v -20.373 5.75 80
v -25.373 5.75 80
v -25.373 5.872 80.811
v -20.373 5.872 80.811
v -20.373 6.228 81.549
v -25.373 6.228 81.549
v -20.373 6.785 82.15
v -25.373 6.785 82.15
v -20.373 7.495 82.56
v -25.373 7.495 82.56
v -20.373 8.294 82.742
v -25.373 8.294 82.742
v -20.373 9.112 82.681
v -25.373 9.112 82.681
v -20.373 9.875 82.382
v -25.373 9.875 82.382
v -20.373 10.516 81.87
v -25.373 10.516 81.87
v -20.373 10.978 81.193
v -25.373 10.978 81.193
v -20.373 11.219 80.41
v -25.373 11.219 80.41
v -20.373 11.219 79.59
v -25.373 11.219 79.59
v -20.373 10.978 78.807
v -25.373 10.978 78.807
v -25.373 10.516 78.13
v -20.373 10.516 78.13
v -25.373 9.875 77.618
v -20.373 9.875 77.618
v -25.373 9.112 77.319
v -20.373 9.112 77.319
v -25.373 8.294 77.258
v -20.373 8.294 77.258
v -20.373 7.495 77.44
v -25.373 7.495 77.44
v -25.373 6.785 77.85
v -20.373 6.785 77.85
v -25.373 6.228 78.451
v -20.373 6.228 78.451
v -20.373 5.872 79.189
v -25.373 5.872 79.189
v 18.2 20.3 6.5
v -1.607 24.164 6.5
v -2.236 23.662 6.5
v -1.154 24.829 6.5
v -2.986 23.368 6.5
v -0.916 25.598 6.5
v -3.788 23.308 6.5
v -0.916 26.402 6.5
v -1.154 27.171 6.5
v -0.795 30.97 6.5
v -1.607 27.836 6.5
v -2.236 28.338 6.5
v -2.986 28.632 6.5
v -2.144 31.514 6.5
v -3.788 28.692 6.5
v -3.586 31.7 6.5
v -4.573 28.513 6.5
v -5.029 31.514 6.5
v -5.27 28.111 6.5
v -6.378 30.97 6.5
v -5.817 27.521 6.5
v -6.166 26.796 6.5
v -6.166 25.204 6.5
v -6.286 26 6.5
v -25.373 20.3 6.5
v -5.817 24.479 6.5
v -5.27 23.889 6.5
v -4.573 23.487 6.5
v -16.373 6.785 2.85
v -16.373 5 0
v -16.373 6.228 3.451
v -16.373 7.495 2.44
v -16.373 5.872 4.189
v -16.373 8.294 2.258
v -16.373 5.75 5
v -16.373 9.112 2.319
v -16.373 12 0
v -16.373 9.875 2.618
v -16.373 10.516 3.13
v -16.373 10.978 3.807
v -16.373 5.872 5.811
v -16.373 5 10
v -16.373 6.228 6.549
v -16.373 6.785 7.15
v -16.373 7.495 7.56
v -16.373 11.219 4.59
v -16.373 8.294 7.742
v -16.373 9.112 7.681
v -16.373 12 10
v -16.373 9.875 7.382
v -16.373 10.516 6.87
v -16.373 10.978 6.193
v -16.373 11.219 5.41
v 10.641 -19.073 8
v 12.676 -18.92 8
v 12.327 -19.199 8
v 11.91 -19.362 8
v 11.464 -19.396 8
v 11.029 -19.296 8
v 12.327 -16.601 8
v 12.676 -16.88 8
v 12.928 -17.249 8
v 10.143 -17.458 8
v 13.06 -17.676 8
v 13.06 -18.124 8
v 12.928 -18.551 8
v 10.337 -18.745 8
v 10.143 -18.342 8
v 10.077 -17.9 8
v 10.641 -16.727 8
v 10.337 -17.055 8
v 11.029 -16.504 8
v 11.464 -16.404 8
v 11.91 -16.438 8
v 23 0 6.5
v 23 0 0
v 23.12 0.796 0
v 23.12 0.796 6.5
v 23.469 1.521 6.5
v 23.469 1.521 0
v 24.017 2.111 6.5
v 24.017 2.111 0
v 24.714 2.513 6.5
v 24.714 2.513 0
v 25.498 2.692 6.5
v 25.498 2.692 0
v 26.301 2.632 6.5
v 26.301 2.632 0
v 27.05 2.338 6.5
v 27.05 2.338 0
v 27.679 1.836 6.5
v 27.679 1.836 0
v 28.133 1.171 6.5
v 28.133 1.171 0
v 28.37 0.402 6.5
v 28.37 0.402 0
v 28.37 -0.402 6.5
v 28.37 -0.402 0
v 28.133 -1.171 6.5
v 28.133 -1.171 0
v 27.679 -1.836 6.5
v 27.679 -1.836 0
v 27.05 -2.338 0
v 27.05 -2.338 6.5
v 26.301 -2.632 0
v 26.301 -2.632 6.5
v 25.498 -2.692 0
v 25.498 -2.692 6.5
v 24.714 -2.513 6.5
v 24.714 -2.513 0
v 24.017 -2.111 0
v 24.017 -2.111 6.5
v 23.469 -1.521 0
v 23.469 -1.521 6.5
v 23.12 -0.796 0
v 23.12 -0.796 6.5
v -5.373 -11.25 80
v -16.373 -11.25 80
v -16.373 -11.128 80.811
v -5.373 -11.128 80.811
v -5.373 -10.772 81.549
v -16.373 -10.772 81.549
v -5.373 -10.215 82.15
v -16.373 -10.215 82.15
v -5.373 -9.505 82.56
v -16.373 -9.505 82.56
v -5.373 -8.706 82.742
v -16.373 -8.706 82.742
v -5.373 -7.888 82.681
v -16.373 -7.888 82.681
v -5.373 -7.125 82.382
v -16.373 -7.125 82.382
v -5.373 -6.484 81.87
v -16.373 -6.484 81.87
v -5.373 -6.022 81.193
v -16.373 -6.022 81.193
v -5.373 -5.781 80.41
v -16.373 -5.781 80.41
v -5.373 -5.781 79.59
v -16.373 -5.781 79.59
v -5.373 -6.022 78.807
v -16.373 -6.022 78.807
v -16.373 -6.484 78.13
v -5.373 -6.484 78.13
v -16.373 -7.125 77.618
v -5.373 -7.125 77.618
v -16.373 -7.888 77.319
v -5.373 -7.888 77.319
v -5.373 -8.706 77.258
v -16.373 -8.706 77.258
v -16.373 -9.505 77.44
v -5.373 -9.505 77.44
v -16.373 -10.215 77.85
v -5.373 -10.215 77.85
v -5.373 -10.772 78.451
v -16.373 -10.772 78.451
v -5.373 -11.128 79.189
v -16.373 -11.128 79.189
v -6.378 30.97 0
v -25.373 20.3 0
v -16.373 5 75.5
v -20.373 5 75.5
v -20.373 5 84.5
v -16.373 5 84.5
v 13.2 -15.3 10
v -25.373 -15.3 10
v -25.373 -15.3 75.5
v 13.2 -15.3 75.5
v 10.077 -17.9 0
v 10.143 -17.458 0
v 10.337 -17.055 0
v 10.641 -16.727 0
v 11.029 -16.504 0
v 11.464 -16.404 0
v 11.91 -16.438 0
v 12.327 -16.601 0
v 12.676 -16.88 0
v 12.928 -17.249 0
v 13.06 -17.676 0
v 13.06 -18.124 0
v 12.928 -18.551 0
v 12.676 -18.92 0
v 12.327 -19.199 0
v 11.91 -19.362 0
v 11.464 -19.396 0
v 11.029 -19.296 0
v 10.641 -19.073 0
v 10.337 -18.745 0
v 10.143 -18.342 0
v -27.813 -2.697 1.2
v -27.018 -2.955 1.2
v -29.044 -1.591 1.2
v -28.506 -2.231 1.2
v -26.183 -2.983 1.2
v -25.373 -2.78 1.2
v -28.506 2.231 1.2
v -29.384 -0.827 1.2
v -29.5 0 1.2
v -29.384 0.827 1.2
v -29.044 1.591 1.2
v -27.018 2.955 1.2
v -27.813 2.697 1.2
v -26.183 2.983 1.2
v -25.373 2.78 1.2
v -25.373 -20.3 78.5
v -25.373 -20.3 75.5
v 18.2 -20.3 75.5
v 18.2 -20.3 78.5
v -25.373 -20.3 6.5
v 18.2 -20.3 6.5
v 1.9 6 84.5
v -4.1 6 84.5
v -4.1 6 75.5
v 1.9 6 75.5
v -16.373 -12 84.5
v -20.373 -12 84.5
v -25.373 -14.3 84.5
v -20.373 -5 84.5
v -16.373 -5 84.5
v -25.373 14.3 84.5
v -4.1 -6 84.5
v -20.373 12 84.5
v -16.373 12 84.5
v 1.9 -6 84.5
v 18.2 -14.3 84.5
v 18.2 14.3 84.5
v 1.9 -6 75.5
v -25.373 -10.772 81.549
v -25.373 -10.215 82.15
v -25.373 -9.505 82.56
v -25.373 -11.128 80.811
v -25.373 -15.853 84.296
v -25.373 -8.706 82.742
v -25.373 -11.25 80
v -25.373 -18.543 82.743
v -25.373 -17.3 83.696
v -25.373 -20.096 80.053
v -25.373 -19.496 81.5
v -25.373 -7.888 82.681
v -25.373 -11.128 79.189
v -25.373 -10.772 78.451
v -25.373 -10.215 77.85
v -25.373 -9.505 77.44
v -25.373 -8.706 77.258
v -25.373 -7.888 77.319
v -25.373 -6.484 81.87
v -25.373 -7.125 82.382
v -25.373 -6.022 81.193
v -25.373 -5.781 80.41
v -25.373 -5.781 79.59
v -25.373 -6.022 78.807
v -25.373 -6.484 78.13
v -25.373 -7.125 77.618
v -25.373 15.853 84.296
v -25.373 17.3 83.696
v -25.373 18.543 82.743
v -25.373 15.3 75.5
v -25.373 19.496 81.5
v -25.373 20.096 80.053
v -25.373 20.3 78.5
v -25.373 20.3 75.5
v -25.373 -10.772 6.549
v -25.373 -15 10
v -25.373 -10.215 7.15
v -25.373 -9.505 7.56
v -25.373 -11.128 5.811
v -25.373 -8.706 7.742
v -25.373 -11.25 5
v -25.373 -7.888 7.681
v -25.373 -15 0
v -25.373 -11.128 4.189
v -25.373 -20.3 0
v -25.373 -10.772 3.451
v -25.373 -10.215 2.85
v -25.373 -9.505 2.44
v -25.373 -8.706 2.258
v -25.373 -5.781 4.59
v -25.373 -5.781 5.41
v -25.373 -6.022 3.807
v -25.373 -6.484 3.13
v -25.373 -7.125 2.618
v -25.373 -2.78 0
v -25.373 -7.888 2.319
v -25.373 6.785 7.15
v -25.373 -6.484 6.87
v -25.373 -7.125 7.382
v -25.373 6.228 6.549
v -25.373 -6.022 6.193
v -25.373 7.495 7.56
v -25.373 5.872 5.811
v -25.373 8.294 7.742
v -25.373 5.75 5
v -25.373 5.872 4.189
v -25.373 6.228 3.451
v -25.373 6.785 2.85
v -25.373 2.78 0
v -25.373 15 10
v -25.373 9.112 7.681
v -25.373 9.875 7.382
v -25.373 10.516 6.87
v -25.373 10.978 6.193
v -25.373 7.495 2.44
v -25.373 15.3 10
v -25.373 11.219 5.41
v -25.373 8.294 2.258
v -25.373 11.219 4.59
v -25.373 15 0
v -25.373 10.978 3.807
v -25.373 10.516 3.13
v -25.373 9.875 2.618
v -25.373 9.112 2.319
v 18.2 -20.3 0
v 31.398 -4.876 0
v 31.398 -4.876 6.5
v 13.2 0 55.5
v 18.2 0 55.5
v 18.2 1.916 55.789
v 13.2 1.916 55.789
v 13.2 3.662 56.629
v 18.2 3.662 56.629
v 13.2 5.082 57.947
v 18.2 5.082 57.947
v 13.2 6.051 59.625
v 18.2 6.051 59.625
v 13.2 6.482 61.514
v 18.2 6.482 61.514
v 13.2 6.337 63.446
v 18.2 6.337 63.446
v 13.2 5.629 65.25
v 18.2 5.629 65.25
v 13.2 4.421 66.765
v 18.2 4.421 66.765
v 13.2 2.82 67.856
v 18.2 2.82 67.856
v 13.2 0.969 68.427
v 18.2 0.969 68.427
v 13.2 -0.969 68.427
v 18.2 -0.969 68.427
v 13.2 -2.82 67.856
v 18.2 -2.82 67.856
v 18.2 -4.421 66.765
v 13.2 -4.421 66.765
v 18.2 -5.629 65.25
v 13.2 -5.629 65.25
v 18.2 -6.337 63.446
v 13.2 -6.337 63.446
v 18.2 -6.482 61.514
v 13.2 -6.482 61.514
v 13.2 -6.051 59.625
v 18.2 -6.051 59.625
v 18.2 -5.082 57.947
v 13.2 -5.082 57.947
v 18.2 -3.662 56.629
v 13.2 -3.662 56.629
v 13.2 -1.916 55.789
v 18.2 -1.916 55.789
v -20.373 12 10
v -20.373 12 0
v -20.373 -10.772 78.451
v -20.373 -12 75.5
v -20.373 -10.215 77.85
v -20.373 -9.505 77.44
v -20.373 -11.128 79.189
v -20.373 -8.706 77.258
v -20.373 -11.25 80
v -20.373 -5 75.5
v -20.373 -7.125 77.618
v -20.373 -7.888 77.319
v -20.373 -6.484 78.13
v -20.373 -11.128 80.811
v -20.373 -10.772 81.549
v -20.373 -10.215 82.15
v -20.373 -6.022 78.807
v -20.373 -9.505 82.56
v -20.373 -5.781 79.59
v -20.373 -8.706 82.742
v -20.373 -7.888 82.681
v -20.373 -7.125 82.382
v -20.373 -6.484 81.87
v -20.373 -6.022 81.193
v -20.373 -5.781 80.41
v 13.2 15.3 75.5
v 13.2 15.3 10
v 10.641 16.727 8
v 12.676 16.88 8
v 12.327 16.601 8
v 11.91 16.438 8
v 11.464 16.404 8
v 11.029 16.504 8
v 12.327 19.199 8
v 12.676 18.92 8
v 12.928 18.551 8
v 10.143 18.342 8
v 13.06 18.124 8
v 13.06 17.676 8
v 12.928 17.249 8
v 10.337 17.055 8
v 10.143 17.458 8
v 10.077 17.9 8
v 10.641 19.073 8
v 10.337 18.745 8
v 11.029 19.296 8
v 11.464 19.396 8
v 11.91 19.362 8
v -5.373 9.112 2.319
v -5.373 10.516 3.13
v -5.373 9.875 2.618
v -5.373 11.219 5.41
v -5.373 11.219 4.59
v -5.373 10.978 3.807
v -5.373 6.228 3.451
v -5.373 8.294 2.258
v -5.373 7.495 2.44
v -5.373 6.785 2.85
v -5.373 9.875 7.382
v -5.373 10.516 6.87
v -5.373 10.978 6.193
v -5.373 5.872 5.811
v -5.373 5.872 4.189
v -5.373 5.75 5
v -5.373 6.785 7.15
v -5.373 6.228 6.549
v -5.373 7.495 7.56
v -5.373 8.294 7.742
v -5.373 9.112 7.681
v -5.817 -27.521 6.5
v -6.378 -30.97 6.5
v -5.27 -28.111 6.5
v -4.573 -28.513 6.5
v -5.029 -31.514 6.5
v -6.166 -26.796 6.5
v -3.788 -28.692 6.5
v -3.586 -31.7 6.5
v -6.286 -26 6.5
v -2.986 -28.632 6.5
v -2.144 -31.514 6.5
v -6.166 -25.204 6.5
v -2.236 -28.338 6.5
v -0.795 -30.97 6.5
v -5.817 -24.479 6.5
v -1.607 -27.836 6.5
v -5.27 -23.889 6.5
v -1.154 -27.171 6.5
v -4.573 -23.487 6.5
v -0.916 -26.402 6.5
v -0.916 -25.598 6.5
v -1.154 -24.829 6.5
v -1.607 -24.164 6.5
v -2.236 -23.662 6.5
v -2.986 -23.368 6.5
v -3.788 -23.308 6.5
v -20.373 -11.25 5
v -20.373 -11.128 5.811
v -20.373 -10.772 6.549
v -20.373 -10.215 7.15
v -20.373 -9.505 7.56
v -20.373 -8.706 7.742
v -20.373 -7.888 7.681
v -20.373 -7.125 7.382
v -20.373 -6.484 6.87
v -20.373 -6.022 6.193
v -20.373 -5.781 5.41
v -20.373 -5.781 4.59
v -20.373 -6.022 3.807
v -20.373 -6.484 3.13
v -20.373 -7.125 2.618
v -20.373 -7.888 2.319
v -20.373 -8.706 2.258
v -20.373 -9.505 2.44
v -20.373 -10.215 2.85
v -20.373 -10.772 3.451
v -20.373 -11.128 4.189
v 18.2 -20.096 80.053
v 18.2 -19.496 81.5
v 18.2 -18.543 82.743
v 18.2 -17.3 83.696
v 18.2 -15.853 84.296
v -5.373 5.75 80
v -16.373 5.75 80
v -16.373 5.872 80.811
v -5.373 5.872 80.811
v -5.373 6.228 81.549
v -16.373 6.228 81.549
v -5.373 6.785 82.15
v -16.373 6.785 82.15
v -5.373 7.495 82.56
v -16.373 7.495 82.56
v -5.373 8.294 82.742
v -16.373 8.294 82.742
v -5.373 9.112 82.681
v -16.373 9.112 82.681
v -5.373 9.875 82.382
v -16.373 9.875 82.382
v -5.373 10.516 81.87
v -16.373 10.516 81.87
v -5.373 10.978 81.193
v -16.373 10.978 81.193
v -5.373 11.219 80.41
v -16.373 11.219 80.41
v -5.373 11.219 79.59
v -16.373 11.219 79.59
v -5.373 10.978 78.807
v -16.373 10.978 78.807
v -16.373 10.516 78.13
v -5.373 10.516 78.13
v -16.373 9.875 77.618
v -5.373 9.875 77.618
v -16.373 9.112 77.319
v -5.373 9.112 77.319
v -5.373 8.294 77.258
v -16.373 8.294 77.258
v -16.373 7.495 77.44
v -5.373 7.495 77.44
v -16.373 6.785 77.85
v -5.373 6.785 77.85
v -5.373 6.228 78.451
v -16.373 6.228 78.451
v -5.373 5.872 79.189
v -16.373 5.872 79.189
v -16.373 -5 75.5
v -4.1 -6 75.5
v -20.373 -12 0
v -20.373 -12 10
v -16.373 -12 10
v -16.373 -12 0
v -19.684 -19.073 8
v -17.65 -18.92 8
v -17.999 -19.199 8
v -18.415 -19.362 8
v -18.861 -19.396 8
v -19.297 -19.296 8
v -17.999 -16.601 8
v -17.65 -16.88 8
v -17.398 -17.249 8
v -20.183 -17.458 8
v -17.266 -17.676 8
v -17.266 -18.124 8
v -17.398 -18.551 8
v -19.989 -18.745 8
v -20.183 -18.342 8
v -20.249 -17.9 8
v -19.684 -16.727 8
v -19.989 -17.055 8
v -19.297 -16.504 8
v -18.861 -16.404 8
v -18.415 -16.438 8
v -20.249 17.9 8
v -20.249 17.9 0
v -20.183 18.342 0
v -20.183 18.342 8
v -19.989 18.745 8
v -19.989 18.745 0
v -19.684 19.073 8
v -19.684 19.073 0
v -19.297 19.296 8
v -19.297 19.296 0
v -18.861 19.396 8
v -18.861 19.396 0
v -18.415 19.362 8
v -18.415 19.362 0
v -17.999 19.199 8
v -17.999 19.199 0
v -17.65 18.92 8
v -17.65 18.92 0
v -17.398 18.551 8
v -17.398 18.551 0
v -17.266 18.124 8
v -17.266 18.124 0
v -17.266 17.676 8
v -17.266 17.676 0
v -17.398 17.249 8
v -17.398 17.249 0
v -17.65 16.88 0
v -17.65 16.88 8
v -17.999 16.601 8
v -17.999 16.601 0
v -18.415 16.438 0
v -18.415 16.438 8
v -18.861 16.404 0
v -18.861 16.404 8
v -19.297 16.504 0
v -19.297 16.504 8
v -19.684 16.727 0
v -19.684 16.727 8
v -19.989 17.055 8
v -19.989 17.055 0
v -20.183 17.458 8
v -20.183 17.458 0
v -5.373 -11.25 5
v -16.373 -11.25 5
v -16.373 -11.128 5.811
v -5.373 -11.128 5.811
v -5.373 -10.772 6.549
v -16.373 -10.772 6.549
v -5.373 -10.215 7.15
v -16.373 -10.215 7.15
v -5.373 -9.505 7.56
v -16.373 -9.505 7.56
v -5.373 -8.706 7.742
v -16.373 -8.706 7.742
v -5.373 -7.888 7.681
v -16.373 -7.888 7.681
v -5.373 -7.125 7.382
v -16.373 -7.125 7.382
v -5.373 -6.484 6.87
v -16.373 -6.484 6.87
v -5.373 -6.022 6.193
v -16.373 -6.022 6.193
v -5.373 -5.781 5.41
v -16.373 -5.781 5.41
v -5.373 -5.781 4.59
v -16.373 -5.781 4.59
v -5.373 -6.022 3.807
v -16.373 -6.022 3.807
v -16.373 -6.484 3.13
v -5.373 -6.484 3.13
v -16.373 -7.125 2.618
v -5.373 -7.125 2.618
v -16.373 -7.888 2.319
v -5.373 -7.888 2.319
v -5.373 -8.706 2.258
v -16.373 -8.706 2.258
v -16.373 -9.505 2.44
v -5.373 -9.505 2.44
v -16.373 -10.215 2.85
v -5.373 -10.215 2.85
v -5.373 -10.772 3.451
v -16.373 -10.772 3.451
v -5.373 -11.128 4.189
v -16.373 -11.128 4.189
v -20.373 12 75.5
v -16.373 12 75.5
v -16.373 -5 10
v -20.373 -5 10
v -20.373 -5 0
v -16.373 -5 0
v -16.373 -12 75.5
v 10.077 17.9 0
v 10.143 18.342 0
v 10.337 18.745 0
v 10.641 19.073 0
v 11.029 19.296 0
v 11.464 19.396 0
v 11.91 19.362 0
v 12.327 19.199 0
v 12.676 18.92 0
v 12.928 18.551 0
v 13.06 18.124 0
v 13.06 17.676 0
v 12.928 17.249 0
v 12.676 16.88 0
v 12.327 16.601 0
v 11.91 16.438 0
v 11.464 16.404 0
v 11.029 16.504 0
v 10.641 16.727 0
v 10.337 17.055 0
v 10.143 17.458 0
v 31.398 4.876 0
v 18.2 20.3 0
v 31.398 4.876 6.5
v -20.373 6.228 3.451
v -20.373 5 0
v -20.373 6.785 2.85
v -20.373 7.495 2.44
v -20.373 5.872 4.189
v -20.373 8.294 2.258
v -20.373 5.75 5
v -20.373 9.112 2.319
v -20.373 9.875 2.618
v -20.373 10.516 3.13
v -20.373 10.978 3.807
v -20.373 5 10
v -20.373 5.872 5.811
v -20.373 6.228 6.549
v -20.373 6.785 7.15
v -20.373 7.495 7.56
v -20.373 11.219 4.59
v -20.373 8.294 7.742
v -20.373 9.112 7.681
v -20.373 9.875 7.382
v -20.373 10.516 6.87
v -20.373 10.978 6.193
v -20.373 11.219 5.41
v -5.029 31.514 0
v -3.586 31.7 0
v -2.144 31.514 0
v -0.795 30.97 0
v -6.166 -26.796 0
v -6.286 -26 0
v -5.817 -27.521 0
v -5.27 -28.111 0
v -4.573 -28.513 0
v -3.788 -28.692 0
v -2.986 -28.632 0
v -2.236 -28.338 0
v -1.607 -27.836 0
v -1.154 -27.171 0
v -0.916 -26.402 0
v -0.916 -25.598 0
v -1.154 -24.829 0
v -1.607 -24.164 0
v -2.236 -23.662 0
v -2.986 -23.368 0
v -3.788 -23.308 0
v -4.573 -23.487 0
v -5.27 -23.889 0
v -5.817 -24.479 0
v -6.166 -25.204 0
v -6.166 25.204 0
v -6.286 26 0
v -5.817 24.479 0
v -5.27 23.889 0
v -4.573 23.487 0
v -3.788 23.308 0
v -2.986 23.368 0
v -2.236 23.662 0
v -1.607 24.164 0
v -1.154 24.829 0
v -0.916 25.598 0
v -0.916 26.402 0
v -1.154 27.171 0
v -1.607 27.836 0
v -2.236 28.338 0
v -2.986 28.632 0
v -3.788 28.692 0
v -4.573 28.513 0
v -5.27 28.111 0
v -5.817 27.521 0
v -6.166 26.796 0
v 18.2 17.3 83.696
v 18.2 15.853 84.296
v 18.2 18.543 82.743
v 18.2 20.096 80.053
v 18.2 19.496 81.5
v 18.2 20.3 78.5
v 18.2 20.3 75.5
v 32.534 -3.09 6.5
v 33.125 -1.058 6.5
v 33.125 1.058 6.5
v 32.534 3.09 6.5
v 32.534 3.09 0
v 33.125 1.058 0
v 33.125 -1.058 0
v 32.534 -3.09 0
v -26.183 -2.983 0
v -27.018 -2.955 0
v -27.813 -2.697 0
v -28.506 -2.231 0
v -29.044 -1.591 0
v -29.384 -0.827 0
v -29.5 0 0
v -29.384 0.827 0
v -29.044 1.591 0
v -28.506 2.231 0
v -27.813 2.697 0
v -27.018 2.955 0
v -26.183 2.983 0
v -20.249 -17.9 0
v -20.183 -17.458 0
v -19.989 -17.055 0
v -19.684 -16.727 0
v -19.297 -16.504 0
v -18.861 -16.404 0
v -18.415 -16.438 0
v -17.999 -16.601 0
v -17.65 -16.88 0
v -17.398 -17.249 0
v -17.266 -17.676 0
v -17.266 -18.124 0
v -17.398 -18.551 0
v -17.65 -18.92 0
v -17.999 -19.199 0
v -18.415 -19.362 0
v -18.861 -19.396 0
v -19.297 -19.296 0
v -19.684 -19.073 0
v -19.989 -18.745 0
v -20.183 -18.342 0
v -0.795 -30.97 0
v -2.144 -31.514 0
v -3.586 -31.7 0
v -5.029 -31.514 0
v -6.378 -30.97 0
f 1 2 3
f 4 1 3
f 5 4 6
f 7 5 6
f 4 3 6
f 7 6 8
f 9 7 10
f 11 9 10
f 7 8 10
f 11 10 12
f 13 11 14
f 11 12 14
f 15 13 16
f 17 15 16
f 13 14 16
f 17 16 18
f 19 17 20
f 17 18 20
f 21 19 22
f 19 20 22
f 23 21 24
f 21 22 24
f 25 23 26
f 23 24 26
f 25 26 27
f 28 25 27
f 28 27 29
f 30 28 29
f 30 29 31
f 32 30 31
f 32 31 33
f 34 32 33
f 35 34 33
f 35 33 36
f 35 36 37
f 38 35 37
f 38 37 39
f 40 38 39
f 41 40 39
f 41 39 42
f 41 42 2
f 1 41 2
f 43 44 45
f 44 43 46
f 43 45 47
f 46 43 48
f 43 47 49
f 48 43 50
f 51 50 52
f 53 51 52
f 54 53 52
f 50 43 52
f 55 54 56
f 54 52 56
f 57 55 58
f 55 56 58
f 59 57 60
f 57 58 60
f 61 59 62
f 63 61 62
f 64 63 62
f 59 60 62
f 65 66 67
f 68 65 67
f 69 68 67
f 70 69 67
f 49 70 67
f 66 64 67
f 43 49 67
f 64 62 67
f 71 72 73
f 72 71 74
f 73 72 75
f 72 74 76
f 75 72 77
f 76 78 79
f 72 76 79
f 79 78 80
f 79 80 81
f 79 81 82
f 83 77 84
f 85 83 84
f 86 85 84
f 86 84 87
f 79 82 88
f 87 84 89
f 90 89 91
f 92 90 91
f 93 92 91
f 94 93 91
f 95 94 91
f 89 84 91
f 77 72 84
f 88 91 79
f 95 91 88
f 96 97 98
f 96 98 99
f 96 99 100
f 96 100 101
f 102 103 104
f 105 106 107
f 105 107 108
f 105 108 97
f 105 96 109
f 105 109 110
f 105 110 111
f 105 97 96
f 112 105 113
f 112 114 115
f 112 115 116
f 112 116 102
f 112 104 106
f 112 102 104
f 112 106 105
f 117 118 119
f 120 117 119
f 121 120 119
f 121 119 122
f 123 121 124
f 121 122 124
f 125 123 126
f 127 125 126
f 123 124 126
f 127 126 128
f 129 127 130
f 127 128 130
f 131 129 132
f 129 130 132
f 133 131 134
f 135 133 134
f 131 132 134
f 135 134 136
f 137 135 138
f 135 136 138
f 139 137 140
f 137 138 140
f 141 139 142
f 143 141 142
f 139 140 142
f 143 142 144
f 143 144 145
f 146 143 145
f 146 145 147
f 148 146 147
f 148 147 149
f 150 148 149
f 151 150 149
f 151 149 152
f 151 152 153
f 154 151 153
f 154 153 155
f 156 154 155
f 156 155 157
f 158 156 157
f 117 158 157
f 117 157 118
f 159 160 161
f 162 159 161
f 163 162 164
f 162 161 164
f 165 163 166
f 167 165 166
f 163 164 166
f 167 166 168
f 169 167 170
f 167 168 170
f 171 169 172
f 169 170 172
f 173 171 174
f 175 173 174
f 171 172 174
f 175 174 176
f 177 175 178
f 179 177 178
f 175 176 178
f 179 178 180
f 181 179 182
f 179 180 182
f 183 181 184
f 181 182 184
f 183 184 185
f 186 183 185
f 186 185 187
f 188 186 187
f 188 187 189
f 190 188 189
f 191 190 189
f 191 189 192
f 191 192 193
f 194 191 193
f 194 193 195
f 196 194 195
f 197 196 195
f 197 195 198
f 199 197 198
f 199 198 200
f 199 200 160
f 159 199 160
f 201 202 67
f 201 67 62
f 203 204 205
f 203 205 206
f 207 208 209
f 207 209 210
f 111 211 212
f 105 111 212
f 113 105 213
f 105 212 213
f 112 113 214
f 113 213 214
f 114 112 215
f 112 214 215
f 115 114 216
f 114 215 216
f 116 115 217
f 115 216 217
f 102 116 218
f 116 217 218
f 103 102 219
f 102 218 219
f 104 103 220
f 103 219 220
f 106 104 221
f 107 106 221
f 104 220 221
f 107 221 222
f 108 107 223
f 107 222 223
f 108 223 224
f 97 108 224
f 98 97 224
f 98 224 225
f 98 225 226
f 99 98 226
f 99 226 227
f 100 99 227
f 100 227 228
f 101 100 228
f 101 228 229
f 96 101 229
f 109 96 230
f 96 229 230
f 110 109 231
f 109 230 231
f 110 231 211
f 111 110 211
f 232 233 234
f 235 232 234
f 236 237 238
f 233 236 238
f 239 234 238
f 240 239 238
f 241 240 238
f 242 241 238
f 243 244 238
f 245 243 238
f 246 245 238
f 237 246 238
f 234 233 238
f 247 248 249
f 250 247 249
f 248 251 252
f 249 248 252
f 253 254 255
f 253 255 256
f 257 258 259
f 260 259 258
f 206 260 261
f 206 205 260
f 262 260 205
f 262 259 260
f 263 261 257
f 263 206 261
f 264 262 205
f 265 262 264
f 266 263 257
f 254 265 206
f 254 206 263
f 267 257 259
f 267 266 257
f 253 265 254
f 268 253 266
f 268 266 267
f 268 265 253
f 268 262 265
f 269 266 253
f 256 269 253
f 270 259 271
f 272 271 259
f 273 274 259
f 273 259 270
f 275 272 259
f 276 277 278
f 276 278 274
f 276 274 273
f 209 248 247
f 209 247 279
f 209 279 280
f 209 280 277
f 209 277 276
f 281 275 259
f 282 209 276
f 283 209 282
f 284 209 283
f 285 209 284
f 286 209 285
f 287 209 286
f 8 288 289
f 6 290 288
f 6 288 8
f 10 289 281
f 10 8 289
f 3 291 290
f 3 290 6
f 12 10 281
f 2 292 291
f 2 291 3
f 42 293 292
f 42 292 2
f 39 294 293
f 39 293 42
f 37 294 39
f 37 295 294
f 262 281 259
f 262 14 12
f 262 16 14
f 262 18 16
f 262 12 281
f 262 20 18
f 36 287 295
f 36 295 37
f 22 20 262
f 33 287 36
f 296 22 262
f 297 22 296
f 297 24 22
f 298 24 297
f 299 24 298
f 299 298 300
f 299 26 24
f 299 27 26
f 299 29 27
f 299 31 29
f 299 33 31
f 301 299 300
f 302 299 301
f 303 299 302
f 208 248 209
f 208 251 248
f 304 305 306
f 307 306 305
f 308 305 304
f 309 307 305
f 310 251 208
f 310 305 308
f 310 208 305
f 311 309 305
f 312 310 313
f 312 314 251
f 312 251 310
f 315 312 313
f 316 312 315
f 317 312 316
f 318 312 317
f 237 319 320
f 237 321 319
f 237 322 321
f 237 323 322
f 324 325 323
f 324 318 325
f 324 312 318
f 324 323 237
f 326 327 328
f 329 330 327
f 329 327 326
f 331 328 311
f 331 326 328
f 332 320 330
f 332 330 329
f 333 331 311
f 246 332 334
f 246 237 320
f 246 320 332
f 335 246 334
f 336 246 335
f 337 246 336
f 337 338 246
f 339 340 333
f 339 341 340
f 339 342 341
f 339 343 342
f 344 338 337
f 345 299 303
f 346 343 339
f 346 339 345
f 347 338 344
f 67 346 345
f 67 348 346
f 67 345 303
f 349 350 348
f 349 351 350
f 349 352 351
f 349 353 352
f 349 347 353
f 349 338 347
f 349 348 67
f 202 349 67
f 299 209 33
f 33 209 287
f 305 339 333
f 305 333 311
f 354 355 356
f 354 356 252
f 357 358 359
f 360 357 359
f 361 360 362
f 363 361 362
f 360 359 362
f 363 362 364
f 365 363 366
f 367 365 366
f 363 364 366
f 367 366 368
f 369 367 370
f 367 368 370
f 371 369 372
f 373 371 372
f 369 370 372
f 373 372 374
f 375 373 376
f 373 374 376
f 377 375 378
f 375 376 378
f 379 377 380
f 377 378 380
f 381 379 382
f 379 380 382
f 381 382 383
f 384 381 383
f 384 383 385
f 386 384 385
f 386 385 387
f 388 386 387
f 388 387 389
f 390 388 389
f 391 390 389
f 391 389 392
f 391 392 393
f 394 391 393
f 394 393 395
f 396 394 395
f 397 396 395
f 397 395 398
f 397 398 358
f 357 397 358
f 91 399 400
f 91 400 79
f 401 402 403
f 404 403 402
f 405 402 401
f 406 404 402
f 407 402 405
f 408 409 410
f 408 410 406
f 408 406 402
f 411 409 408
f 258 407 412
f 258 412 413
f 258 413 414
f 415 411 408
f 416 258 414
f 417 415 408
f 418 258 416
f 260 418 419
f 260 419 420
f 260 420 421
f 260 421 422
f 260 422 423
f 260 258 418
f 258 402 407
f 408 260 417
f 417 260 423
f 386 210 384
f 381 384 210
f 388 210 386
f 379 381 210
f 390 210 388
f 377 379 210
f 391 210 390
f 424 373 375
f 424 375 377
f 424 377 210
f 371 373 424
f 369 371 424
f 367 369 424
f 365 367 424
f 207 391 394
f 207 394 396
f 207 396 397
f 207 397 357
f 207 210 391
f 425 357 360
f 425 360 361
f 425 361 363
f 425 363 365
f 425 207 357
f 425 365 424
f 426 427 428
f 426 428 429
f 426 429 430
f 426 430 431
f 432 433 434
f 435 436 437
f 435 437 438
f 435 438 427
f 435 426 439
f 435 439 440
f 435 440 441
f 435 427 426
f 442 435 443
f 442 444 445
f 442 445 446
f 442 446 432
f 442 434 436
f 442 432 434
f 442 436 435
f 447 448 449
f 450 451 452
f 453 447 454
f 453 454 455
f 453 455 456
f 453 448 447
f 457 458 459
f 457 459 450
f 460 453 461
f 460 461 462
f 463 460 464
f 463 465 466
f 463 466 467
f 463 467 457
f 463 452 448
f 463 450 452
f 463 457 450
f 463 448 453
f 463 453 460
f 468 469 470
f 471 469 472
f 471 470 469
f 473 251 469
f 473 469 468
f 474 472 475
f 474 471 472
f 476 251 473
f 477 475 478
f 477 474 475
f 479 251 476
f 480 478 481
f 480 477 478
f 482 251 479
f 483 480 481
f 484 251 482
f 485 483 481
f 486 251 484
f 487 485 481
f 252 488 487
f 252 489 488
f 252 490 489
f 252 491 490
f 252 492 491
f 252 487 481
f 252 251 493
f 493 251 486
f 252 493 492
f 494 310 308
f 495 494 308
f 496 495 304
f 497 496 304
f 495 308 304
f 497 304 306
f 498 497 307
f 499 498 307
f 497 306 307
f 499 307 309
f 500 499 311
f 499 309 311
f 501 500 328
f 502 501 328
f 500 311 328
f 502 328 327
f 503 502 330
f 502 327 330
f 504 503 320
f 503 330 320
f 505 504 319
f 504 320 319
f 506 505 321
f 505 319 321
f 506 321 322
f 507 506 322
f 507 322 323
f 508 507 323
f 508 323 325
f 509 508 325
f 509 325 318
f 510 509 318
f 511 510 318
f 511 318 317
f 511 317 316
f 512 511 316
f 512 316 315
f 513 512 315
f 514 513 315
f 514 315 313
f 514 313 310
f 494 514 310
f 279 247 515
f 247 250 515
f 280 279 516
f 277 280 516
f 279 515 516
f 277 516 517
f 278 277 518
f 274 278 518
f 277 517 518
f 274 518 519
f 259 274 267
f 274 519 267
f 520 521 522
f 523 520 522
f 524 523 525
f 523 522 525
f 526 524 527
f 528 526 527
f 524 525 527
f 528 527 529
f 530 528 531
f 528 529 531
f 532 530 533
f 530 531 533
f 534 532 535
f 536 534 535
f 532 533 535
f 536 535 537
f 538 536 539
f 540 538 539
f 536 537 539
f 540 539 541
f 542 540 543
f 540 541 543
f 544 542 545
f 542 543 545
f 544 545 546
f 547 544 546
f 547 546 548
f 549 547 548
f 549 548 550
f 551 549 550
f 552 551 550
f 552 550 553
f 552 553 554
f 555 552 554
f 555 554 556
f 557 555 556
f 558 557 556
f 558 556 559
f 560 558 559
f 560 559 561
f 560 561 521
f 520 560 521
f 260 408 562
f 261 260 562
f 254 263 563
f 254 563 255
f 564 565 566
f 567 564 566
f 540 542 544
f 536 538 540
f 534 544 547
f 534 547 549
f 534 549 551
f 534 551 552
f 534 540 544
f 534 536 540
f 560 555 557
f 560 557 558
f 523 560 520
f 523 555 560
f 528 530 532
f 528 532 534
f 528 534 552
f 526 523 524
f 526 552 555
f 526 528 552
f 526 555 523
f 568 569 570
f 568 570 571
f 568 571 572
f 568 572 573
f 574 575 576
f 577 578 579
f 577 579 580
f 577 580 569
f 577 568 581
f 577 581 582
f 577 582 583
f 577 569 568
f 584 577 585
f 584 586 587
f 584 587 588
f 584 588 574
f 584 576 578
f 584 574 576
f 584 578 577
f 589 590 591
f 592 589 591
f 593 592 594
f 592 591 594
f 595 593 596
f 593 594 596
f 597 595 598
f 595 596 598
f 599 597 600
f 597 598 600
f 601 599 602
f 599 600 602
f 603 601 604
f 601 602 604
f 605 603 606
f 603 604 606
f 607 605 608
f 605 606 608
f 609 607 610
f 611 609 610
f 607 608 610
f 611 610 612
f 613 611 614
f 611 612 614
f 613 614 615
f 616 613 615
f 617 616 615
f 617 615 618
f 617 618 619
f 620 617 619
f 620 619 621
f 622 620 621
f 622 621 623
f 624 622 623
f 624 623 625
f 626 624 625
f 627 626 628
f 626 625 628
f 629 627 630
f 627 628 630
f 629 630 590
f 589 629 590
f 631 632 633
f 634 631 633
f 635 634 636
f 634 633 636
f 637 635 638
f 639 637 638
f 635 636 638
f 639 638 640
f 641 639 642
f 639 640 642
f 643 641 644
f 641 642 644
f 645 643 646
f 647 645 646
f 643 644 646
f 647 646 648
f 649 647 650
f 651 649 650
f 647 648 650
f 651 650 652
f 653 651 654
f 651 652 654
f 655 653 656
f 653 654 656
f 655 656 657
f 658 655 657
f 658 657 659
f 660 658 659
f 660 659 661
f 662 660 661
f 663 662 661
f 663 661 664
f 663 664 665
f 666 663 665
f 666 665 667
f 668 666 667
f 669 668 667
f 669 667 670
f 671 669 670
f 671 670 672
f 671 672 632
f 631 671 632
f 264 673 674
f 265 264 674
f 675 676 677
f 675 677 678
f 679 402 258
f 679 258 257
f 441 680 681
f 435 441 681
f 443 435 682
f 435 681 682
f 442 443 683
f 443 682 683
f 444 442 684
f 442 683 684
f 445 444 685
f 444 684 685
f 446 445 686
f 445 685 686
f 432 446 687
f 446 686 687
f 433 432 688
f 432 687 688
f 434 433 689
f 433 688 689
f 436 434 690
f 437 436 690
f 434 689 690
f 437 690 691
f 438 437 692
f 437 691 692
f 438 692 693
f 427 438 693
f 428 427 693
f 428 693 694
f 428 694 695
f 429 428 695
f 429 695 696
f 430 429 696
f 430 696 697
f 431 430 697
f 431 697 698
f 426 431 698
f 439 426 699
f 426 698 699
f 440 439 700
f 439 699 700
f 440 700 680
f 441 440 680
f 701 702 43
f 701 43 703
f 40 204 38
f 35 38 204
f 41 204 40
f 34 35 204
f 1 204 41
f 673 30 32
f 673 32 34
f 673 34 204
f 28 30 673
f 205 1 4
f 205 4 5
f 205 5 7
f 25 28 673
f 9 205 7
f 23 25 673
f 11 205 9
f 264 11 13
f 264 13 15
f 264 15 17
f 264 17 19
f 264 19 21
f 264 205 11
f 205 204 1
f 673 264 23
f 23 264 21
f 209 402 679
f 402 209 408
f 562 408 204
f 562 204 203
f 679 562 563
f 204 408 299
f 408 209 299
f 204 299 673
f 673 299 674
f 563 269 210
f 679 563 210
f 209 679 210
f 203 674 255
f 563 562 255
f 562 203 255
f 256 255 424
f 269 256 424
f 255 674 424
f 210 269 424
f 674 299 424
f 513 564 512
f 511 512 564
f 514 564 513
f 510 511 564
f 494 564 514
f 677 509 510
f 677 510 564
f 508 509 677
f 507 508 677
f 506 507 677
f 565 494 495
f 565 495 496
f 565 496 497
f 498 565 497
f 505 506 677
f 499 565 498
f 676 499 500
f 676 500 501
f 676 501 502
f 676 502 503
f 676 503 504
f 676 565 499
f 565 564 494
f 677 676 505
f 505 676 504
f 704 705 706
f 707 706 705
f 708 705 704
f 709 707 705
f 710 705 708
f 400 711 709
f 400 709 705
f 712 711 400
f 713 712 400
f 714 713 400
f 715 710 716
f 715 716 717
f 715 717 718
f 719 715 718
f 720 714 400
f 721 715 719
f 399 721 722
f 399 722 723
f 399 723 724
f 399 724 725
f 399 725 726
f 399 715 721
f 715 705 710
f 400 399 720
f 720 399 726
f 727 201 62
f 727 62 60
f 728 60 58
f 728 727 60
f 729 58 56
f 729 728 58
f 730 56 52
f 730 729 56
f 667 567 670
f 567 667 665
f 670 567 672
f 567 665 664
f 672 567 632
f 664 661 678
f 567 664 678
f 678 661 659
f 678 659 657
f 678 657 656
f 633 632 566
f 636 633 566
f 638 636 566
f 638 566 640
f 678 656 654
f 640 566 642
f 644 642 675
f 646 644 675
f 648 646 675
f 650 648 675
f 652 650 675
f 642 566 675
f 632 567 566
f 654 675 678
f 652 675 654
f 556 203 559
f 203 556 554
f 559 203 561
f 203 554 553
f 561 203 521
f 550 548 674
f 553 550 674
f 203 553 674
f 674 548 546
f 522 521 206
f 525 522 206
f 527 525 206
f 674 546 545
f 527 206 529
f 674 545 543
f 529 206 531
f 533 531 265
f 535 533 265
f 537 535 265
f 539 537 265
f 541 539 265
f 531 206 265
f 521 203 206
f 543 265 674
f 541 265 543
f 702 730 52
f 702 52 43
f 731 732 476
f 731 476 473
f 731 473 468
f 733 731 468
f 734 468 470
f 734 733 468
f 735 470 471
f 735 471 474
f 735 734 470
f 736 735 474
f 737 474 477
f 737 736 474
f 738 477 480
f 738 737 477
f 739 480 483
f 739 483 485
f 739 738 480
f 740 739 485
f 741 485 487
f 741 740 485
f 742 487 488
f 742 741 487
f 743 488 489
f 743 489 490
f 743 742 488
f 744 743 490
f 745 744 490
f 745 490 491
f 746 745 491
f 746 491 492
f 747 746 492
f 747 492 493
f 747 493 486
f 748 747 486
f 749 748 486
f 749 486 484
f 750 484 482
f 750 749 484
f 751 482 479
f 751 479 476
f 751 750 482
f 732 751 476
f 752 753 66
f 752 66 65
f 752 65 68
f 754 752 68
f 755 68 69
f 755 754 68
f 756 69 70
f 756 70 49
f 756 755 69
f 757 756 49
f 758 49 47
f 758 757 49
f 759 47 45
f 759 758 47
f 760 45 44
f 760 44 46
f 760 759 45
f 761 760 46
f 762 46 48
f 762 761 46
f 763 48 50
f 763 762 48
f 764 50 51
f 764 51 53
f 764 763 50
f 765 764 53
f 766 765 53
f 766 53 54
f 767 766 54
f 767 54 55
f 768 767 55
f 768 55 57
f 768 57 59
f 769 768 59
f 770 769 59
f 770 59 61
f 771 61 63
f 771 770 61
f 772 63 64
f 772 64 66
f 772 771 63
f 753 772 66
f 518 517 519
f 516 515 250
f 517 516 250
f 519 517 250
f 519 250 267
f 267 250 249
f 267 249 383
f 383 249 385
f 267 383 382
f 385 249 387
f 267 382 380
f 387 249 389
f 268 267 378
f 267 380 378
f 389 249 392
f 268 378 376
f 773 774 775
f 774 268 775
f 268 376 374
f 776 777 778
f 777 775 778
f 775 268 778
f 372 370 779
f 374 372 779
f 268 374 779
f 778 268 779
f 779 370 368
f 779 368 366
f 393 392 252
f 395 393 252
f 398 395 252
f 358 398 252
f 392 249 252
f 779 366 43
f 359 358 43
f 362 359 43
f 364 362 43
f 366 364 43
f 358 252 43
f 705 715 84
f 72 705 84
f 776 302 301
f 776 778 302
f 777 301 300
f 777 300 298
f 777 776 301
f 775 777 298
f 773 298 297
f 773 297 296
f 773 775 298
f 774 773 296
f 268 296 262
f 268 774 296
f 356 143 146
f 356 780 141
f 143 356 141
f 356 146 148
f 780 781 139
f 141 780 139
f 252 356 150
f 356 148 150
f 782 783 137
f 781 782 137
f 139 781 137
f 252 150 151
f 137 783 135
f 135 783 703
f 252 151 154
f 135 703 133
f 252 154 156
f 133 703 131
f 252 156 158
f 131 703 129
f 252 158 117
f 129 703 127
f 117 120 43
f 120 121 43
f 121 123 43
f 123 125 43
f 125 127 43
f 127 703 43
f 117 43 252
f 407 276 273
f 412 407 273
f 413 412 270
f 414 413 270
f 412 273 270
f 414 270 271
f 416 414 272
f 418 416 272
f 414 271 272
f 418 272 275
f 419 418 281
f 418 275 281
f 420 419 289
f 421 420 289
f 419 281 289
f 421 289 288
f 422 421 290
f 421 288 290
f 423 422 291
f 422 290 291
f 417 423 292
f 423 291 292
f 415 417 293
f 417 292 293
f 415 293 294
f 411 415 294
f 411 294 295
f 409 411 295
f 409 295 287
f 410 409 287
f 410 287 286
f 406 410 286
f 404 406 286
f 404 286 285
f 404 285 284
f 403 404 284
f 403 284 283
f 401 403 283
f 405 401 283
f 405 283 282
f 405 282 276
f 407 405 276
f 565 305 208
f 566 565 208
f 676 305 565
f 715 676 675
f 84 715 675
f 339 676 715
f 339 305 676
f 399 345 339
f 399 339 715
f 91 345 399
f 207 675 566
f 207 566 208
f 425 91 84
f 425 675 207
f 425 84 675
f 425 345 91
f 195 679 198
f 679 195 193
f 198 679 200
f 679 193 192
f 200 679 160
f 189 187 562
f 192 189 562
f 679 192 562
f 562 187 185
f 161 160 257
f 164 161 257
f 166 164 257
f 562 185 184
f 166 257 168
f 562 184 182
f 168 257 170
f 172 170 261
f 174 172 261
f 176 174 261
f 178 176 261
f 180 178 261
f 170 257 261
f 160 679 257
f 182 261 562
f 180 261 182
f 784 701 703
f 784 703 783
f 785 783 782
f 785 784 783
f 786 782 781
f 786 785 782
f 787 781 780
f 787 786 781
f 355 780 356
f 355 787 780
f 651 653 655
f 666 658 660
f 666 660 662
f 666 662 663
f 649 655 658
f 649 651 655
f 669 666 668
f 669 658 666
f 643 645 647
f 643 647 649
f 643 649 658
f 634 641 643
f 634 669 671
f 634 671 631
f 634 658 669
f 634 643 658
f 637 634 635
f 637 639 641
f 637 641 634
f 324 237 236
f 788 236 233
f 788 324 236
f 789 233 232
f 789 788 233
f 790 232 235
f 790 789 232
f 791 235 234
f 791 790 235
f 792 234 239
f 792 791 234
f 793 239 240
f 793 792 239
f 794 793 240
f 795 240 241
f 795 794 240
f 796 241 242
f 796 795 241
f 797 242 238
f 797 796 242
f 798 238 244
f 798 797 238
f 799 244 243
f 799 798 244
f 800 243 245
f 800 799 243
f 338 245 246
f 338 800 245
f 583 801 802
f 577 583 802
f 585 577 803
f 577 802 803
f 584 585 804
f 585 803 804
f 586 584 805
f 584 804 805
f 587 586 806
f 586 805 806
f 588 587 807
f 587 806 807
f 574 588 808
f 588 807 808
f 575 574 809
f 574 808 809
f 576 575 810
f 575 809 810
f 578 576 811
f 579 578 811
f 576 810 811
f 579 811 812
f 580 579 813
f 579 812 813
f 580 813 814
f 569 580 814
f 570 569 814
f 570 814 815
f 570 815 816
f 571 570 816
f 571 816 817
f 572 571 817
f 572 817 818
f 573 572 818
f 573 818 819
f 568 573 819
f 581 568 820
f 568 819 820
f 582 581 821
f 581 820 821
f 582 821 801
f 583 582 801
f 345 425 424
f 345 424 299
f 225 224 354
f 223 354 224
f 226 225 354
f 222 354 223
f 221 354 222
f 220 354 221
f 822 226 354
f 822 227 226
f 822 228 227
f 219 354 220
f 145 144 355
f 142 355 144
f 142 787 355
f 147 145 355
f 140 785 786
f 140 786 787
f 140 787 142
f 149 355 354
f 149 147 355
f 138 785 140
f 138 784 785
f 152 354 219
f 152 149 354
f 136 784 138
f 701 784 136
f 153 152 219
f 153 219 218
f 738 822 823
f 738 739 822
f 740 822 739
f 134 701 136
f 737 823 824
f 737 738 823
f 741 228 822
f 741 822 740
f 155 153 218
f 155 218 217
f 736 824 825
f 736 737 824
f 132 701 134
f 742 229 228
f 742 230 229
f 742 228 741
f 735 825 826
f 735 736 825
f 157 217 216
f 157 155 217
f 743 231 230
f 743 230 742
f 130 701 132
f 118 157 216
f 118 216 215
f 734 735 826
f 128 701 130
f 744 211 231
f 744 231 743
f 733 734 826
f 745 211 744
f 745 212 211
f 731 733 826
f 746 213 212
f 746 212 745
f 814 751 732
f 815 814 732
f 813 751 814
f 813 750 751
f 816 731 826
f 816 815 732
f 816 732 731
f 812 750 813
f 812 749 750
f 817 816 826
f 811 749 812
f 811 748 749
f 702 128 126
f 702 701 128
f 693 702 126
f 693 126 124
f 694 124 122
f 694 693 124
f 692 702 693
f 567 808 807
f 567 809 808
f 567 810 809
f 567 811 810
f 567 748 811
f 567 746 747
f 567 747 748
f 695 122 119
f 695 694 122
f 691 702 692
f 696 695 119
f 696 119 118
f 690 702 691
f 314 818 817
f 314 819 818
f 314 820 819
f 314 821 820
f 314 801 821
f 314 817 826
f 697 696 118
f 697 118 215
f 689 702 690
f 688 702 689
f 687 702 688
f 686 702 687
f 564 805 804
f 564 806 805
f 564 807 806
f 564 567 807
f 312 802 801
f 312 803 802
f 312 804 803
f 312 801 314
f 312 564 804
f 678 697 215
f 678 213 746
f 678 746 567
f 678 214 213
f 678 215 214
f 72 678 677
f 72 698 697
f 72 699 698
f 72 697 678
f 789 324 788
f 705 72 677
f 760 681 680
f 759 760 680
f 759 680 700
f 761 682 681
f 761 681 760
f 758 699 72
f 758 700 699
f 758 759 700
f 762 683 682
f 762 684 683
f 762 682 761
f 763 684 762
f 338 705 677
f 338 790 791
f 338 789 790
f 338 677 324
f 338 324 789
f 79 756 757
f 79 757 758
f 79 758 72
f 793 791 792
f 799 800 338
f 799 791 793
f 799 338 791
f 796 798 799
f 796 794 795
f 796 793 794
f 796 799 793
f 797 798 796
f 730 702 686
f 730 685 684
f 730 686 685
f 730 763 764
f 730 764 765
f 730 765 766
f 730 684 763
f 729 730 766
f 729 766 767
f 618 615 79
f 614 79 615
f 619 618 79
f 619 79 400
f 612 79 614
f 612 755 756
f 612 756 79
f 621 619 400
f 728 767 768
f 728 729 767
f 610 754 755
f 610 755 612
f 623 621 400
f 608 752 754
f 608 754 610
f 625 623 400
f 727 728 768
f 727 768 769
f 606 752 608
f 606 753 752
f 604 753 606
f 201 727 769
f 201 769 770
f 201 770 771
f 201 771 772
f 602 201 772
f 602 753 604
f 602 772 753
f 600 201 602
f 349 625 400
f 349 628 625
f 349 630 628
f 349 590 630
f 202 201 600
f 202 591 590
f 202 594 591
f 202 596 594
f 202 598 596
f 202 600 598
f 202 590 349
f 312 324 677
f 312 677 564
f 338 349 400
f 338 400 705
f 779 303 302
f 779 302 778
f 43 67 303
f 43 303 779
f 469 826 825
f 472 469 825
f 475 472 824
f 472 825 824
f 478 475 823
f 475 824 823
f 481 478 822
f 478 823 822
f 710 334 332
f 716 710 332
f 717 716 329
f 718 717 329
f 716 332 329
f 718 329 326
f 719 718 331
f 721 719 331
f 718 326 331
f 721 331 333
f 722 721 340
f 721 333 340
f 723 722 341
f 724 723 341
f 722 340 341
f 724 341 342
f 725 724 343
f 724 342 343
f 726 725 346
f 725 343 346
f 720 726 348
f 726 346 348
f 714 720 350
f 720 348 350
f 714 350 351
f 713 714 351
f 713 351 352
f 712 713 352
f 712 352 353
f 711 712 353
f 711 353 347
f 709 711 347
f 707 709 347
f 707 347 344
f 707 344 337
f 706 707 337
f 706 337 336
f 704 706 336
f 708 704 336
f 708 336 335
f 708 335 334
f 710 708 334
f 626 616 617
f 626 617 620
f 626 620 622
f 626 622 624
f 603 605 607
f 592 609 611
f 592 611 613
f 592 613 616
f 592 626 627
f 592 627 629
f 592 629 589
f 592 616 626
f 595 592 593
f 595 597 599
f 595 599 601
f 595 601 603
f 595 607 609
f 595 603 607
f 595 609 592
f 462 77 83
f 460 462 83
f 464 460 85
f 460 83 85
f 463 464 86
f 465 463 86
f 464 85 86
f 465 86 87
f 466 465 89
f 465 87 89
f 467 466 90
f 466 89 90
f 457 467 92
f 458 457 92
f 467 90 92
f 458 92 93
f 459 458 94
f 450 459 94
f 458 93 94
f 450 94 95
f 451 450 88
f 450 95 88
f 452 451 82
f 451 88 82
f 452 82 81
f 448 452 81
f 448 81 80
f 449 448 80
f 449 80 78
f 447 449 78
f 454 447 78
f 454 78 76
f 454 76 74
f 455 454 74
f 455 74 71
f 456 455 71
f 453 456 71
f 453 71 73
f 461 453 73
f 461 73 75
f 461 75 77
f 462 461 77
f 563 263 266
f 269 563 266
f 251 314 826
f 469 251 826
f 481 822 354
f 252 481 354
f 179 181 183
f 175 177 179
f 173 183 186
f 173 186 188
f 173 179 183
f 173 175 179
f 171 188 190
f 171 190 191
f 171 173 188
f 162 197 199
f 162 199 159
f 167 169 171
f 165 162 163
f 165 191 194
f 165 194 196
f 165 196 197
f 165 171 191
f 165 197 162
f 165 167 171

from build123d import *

# Parameters (mm, degrees)
SKETCH1_W           = 32.4
SKETCH1_H           = 15
BOSS_EXTRUDE1_DEPTH = 10
SKETCH4_W           = 26.527336133
SKETCH4_H           = 10
CUT_EXTRUDE2_DEPTH  = 80
SKETCH5_R           = 2.75
CUT_EXTRUDE3_DEPTH  = 20
BOSS_EXTRUDE2_DEPTH = 10
BOSS_EXTRUDE3_DEPTH = 75.5
SKETCH9_W           = 43.572663867
SKETCH9_H           = 40.6
BOSS_EXTRUDE4_DEPTH = 9
FILLET1_R           = 6
SKETCH10_R          = 2.75
CUT_EXTRUDE4_DEPTH  = 20
SKETCH11_W          = 4
SKETCH11_H          = 7
CUT_EXTRUDE5_DEPTH  = 122
SKETCH12_R          = 3
BOSS_EXTRUDE5_DEPTH = 1.2
SKETCH13_R          = 2.7
BOSS_EXTRUDE6_DEPTH = 6.5
SKETCH14_R          = 1.5
CUT_EXTRUDE6_DEPTH  = 8
SKETCH15_R          = 4.2
CUT_EXTRUDE7_DEPTH  = 8
BOSS_EXTRUDE9_DEPTH = 6.5
SKETCH17_R          = 2.7
CUT_EXTRUDE8_DEPTH  = 8
SKETCH18_W          = 6
SKETCH18_H          = 12
CUT_EXTRUDE9_DEPTH  = 23
SKETCH19_R          = 6.5
CUT_EXTRUDE10_DEPTH = 23


with BuildPart() as part:
    # Sketch1 → Boss-Extrude1 (new body)
    with BuildSketch(Plane.XY):
        with Locations((-3.3, 7.5)):
            Rectangle(SKETCH1_W, SKETCH1_H)
        with Locations((-3.3, -7.5)):
            Rectangle(SKETCH1_W, SKETCH1_H)
        with Locations((-35.7, -7.5)):
            Rectangle(SKETCH1_W, SKETCH1_H)
        with Locations((-35.7, 7.5)):
            Rectangle(SKETCH1_W, SKETCH1_H)
    extrude(amount=BOSS_EXTRUDE1_DEPTH)

    # Sketch4 → Cut-Extrude2 (cut)
    with BuildSketch(Plane(origin=(0, 15, 0), x_dir=(1, 0, 0), z_dir=(0, 1, 0))):
        with Locations((-38.636331934, -5)):
            Rectangle(SKETCH4_W, SKETCH4_H)
    extrude(amount=-CUT_EXTRUDE2_DEPTH, mode=Mode.SUBTRACT)

    # Sketch5 → Cut-Extrude3 (cut)
    with BuildSketch(Plane.ZY.offset(25.372663867)):
        with Locations(Location((5, -8.5, 0), (0, 0, 270))):
            Circle(SKETCH5_R)
        with Locations(Location((5, 8.5, 0), (0, 0, 270))):
            Circle(SKETCH5_R)
    extrude(amount=-CUT_EXTRUDE3_DEPTH, mode=Mode.SUBTRACT)

    # Sketch7 → Boss-Extrude2 (add)
    with BuildSketch(Plane(origin=(0, 0, 0), x_dir=(-1, 0, 0), z_dir=(0, 0, -1))):
        Polygon((-12.9, -15.3), (-13.2, -15.3), (-13.2, 15.3), (-12.9, 15.3), (25.372663867, 15.3), (25.372663867, 15), (-12.9, 15), (-12.9, -15), (25.372663867, -15), (25.372663867, -15.3), align=None)
    extrude(amount=-BOSS_EXTRUDE2_DEPTH)

    # Sketch8 → Boss-Extrude3 (add)
    with BuildSketch(Plane(origin=(0, 0, 0), x_dir=(-1, 0, 0), z_dir=(0, 0, -1))):
        Polygon((25.372663867, 15.3), (25.372663867, 20.3), (-13.2, 20.3), (-18.2, 20.3), (-18.2, -15.3), (-18.2, -20.3), (-13.2, -20.3), (25.372663867, -20.3), (25.372663867, -15.3), (-13.2, -15.3), (-13.2, 15.3), align=None)
    extrude(amount=-BOSS_EXTRUDE3_DEPTH)

    # Sketch9 → Boss-Extrude4 (add)
    with BuildSketch(Plane.XY.offset(75.5)):
        with Locations((-3.586331933, 0)):
            Rectangle(SKETCH9_W, SKETCH9_H)
    extrude(amount=BOSS_EXTRUDE4_DEPTH)

    # Fillet1
    fillet1_edges = [part.edges().sort_by_distance(p)[0] for p in [
        (-3.586331933, 20.3, 84.5),
        (-3.586331933, -20.3, 84.5),
    ]]
    fillet(fillet1_edges, radius=FILLET1_R)

    # Sketch10 → Cut-Extrude4 (cut)
    with BuildSketch(Plane.ZY.offset(25.372663867)):
        with Locations(Location((80, 8.5, 0), (0, 0, 270))):
            Circle(SKETCH10_R)
        with Locations(Location((80, -8.5, 0), (0, 0, 270))):
            Circle(SKETCH10_R)
    extrude(amount=-CUT_EXTRUDE4_DEPTH, mode=Mode.SUBTRACT)

    # Sketch11 → Cut-Extrude5 (cut)
    with BuildSketch(Plane.XY.offset(84.5)):
        with Locations((-18.372663867, -8.5)):
            Rectangle(SKETCH11_W, SKETCH11_H)
        with Locations((-18.372663867, 8.5)):
            Rectangle(SKETCH11_W, SKETCH11_H)
    extrude(amount=-CUT_EXTRUDE5_DEPTH, mode=Mode.SUBTRACT)

    # Sketch12 → Boss-Extrude5 (add)
    with BuildSketch(Plane(origin=(0, 0, 0), x_dir=(-1, 0, 0), z_dir=(0, 0, -1))):
        with Locations((26.5, 0)):
            Circle(SKETCH12_R)
    extrude(amount=-BOSS_EXTRUDE5_DEPTH)

    # Sketch13 → Boss-Extrude6 (add)
    # profile 1 of 2: a face of its own
    with BuildSketch(Plane.XY):
        with BuildLine():
            ThreePointArc((-6.377852766, 30.969649026), (-3.586331933, 31.7), (-0.794811101, 30.969649026))
            Line((-0.794811101, 30.969649026), (18.2, 20.3))
            Line((18.2, 20.3), (-25.372663867, 20.3))
            Line((-25.372663867, 20.3), (-6.377852766, 30.969649026))
        make_face()
        with Locations(Location((-3.586331933, 26, 0), (0, 0, 180))):
            Circle(SKETCH13_R, mode=Mode.SUBTRACT)
    # profile 2 of 2: a face of its own
    with BuildSketch(Plane.XY):
        with BuildLine():
            Line((-25.372663867, -20.3), (-6.377852766, -30.969649026))
            ThreePointArc((-6.377852766, -30.969649026), (-3.586331933, -31.7), (-0.794811101, -30.969649026))
            Line((-0.794811101, -30.969649026), (18.2, -20.3))
            Line((18.2, -20.3), (-25.372663867, -20.3))
        make_face()
        with Locations(Location((-3.586331933, -26, 0), (0, 0, 180))):
            Circle(SKETCH13_R, mode=Mode.SUBTRACT)
    extrude(amount=BOSS_EXTRUDE6_DEPTH)

    # Sketch14 → Cut-Extrude6 (cut)
    with BuildSketch(Plane(origin=(0, 0, 0), x_dir=(-1, 0, 0), z_dir=(0, 0, -1))):
        with Locations((18.749186637, 17.9)):
            Circle(SKETCH14_R)
        with Locations((-11.57652277, 17.9)):
            Circle(SKETCH14_R)
        with Locations((-11.57652277, -17.9)):
            Circle(SKETCH14_R)
        with Locations((18.749186637, -17.9)):
            Circle(SKETCH14_R)
    extrude(amount=-CUT_EXTRUDE6_DEPTH, mode=Mode.SUBTRACT)

    # Sketch15 → Cut-Extrude7 (cut)
    with BuildSketch(Plane.ZY.offset(-13.2)):
        with Locations((62, 0)):
            Circle(SKETCH15_R)
    extrude(amount=-CUT_EXTRUDE7_DEPTH, mode=Mode.SUBTRACT)

    # Sketch16 → Boss-Extrude9 (add)
    with BuildSketch(Plane(origin=(0, 0, 0), x_dir=(-1, 0, 0), z_dir=(0, 0, -1))):
        with BuildLine():
            Line((-31.398424222, -4.876265107), (-18.2, -20.3))
            Line((-18.2, -20.3), (-18.2, 20.3))
            Line((-18.2, 20.3), (-31.398424222, 4.876265107))
            ThreePointArc((-31.398424222, 4.876265107), (-33.2, 0), (-31.398424222, -4.876265107))
        make_face()
    extrude(amount=-BOSS_EXTRUDE9_DEPTH)

    # Sketch17 → Cut-Extrude8 (cut)
    with BuildSketch(Plane(origin=(0, 0, 0), x_dir=(-1, 0, 0), z_dir=(0, 0, -1))):
        with Locations((-25.7, 0)):
            Circle(SKETCH17_R)
    extrude(amount=-CUT_EXTRUDE8_DEPTH, mode=Mode.SUBTRACT)

    # Sketch18 → Cut-Extrude9 (cut)
    with BuildSketch(Plane.XY.offset(84.5)):
        with Locations((-1.1, 0)):
            Rectangle(SKETCH18_W, SKETCH18_H)
    extrude(amount=-CUT_EXTRUDE9_DEPTH, mode=Mode.SUBTRACT)

    # Sketch19 → Cut-Extrude10 (cut)
    with BuildSketch(Plane(origin=(18.2, 0, 0), x_dir=(0, 0, -1), z_dir=(1, 0, 0))):
        with Locations((-62, 0)):
            Circle(SKETCH19_R)
    extrude(amount=-CUT_EXTRUDE10_DEPTH, mode=Mode.SUBTRACT)


solid = part.part
